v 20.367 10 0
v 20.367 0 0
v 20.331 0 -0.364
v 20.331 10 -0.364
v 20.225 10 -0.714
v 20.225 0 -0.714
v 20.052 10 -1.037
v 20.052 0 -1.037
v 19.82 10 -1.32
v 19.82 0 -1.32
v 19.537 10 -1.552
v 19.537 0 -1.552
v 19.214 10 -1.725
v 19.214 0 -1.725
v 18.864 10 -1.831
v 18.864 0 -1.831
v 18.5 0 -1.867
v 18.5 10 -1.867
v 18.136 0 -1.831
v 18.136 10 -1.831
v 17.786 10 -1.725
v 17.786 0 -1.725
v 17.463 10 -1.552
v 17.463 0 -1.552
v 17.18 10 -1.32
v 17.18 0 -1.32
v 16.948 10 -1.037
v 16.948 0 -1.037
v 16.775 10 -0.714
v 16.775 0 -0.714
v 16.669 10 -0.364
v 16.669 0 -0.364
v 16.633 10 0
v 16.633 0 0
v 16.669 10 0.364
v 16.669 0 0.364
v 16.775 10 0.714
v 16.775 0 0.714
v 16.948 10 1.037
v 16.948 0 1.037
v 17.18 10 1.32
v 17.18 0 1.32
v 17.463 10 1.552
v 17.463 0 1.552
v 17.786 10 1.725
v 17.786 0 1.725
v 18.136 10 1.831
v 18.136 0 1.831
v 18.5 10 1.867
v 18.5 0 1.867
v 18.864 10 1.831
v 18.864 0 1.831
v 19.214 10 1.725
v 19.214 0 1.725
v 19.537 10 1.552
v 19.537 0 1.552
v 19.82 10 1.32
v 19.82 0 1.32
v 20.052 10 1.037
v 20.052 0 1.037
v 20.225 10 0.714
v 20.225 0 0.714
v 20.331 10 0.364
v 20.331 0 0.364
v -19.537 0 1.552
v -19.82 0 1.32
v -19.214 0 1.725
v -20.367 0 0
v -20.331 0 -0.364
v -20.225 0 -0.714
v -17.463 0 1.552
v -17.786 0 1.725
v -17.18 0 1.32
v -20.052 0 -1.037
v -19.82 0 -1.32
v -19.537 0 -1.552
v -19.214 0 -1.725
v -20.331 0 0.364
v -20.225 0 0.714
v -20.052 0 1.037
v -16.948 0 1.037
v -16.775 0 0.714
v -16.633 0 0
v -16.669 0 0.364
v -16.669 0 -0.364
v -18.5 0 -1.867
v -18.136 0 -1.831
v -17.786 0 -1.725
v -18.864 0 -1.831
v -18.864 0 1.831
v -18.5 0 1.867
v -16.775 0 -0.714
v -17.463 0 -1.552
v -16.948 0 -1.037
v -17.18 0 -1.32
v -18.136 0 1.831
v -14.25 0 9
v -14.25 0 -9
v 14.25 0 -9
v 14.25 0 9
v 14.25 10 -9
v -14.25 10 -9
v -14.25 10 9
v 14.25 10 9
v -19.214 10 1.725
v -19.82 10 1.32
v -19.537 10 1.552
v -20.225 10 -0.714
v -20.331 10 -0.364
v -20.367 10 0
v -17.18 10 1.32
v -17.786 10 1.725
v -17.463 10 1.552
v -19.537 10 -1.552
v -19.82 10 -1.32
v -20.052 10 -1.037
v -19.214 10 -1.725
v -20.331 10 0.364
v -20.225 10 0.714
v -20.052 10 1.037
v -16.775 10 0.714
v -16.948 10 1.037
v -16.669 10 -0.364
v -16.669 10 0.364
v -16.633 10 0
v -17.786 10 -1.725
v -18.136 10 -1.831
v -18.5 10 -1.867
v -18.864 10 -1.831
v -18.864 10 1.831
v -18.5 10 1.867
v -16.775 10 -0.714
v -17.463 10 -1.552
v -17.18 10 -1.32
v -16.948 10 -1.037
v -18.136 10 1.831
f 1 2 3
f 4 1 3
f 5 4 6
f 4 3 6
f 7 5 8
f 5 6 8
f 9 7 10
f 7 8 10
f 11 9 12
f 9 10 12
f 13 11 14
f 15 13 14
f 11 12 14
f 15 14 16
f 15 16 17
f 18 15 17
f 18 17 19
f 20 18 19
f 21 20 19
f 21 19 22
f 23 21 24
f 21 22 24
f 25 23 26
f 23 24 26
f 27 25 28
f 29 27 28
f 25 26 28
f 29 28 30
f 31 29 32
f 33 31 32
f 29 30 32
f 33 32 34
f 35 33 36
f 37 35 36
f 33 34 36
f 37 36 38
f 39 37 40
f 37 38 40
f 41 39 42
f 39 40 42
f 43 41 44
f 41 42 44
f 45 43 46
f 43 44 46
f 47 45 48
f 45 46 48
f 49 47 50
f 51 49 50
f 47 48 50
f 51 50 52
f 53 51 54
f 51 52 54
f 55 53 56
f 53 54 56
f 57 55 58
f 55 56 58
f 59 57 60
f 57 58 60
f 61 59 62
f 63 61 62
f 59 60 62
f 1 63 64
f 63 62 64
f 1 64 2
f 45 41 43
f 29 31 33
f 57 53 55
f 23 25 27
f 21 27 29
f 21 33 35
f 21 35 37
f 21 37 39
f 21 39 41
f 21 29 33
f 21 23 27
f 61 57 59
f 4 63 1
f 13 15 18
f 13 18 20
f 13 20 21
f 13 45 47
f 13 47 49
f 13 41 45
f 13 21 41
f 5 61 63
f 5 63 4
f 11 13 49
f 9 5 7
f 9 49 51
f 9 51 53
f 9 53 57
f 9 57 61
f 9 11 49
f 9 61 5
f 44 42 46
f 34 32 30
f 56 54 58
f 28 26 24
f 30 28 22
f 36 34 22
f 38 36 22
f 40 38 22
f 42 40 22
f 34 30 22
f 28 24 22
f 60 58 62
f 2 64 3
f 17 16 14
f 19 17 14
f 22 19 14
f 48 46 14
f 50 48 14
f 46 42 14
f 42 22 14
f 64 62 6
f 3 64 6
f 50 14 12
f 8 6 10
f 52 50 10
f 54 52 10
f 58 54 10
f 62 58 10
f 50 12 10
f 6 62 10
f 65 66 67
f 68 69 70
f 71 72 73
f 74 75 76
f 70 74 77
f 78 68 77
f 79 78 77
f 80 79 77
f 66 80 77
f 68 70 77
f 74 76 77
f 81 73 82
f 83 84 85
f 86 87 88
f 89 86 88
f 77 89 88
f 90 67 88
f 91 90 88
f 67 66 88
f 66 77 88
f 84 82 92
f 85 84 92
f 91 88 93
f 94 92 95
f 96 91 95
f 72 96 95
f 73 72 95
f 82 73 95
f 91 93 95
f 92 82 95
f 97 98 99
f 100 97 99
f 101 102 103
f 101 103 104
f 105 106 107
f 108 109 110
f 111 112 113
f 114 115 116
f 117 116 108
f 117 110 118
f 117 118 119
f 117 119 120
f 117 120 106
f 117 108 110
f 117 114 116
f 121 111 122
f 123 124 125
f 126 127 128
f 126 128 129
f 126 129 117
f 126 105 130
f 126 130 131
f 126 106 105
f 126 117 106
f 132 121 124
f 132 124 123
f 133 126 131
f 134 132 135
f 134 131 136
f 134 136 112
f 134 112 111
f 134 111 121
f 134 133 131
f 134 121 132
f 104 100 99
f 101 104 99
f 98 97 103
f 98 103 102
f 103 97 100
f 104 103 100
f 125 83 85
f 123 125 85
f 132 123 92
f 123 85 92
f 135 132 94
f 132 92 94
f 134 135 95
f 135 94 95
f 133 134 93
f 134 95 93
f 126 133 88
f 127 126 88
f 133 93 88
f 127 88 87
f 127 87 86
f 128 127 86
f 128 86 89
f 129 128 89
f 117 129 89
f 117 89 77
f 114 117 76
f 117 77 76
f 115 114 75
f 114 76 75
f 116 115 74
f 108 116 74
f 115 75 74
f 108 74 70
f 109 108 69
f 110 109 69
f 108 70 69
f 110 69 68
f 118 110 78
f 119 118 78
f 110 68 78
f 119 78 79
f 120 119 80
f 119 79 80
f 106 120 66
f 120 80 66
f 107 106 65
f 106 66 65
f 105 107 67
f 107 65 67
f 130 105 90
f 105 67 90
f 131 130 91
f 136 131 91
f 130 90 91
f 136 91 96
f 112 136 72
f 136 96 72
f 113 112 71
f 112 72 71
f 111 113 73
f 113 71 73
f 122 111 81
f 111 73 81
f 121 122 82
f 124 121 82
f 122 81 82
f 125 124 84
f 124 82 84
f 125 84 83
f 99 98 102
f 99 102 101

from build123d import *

# Parameters (mm, degrees)
SKETCH2_R             = 1.8669
BOSS_EXTRUDE1_DEPTH   = 10
BOSS_EXTRUDE1_2_DEPTH = 10
SKETCH2_W             = 28.5
SKETCH2_H             = 18
BOSS_EXTRUDE1_3_DEPTH = 10


with BuildPart() as part:
    # Sketch2 → Boss-Extrude1 (new body)
    with BuildSketch(Plane(origin=(0, 0, 0), x_dir=(1, 0, 0), z_dir=(0, 1, 0))):
        with Locations((18.5, 0)):
            Circle(SKETCH2_R)
    extrude(amount=BOSS_EXTRUDE1_DEPTH)


with BuildPart() as body_2:
    # Sketch2 → Boss-Extrude1 2 (new body)
    with BuildSketch(Plane(origin=(0, 0, 0), x_dir=(1, 0, 0), z_dir=(0, 1, 0))):
        with Locations((-18.5, 0)):
            Circle(SKETCH2_R)
    extrude(amount=BOSS_EXTRUDE1_2_DEPTH)


with BuildPart() as body_3:
    # Sketch2 → Boss-Extrude1 3 (new body)
    with BuildSketch(Plane(origin=(0, 0, 0), x_dir=(1, 0, 0), z_dir=(0, 1, 0))):
        Rectangle(SKETCH2_W, SKETCH2_H)
    extrude(amount=BOSS_EXTRUDE1_3_DEPTH)


solid = Compound([part.part, body_2.part, body_3.part])
